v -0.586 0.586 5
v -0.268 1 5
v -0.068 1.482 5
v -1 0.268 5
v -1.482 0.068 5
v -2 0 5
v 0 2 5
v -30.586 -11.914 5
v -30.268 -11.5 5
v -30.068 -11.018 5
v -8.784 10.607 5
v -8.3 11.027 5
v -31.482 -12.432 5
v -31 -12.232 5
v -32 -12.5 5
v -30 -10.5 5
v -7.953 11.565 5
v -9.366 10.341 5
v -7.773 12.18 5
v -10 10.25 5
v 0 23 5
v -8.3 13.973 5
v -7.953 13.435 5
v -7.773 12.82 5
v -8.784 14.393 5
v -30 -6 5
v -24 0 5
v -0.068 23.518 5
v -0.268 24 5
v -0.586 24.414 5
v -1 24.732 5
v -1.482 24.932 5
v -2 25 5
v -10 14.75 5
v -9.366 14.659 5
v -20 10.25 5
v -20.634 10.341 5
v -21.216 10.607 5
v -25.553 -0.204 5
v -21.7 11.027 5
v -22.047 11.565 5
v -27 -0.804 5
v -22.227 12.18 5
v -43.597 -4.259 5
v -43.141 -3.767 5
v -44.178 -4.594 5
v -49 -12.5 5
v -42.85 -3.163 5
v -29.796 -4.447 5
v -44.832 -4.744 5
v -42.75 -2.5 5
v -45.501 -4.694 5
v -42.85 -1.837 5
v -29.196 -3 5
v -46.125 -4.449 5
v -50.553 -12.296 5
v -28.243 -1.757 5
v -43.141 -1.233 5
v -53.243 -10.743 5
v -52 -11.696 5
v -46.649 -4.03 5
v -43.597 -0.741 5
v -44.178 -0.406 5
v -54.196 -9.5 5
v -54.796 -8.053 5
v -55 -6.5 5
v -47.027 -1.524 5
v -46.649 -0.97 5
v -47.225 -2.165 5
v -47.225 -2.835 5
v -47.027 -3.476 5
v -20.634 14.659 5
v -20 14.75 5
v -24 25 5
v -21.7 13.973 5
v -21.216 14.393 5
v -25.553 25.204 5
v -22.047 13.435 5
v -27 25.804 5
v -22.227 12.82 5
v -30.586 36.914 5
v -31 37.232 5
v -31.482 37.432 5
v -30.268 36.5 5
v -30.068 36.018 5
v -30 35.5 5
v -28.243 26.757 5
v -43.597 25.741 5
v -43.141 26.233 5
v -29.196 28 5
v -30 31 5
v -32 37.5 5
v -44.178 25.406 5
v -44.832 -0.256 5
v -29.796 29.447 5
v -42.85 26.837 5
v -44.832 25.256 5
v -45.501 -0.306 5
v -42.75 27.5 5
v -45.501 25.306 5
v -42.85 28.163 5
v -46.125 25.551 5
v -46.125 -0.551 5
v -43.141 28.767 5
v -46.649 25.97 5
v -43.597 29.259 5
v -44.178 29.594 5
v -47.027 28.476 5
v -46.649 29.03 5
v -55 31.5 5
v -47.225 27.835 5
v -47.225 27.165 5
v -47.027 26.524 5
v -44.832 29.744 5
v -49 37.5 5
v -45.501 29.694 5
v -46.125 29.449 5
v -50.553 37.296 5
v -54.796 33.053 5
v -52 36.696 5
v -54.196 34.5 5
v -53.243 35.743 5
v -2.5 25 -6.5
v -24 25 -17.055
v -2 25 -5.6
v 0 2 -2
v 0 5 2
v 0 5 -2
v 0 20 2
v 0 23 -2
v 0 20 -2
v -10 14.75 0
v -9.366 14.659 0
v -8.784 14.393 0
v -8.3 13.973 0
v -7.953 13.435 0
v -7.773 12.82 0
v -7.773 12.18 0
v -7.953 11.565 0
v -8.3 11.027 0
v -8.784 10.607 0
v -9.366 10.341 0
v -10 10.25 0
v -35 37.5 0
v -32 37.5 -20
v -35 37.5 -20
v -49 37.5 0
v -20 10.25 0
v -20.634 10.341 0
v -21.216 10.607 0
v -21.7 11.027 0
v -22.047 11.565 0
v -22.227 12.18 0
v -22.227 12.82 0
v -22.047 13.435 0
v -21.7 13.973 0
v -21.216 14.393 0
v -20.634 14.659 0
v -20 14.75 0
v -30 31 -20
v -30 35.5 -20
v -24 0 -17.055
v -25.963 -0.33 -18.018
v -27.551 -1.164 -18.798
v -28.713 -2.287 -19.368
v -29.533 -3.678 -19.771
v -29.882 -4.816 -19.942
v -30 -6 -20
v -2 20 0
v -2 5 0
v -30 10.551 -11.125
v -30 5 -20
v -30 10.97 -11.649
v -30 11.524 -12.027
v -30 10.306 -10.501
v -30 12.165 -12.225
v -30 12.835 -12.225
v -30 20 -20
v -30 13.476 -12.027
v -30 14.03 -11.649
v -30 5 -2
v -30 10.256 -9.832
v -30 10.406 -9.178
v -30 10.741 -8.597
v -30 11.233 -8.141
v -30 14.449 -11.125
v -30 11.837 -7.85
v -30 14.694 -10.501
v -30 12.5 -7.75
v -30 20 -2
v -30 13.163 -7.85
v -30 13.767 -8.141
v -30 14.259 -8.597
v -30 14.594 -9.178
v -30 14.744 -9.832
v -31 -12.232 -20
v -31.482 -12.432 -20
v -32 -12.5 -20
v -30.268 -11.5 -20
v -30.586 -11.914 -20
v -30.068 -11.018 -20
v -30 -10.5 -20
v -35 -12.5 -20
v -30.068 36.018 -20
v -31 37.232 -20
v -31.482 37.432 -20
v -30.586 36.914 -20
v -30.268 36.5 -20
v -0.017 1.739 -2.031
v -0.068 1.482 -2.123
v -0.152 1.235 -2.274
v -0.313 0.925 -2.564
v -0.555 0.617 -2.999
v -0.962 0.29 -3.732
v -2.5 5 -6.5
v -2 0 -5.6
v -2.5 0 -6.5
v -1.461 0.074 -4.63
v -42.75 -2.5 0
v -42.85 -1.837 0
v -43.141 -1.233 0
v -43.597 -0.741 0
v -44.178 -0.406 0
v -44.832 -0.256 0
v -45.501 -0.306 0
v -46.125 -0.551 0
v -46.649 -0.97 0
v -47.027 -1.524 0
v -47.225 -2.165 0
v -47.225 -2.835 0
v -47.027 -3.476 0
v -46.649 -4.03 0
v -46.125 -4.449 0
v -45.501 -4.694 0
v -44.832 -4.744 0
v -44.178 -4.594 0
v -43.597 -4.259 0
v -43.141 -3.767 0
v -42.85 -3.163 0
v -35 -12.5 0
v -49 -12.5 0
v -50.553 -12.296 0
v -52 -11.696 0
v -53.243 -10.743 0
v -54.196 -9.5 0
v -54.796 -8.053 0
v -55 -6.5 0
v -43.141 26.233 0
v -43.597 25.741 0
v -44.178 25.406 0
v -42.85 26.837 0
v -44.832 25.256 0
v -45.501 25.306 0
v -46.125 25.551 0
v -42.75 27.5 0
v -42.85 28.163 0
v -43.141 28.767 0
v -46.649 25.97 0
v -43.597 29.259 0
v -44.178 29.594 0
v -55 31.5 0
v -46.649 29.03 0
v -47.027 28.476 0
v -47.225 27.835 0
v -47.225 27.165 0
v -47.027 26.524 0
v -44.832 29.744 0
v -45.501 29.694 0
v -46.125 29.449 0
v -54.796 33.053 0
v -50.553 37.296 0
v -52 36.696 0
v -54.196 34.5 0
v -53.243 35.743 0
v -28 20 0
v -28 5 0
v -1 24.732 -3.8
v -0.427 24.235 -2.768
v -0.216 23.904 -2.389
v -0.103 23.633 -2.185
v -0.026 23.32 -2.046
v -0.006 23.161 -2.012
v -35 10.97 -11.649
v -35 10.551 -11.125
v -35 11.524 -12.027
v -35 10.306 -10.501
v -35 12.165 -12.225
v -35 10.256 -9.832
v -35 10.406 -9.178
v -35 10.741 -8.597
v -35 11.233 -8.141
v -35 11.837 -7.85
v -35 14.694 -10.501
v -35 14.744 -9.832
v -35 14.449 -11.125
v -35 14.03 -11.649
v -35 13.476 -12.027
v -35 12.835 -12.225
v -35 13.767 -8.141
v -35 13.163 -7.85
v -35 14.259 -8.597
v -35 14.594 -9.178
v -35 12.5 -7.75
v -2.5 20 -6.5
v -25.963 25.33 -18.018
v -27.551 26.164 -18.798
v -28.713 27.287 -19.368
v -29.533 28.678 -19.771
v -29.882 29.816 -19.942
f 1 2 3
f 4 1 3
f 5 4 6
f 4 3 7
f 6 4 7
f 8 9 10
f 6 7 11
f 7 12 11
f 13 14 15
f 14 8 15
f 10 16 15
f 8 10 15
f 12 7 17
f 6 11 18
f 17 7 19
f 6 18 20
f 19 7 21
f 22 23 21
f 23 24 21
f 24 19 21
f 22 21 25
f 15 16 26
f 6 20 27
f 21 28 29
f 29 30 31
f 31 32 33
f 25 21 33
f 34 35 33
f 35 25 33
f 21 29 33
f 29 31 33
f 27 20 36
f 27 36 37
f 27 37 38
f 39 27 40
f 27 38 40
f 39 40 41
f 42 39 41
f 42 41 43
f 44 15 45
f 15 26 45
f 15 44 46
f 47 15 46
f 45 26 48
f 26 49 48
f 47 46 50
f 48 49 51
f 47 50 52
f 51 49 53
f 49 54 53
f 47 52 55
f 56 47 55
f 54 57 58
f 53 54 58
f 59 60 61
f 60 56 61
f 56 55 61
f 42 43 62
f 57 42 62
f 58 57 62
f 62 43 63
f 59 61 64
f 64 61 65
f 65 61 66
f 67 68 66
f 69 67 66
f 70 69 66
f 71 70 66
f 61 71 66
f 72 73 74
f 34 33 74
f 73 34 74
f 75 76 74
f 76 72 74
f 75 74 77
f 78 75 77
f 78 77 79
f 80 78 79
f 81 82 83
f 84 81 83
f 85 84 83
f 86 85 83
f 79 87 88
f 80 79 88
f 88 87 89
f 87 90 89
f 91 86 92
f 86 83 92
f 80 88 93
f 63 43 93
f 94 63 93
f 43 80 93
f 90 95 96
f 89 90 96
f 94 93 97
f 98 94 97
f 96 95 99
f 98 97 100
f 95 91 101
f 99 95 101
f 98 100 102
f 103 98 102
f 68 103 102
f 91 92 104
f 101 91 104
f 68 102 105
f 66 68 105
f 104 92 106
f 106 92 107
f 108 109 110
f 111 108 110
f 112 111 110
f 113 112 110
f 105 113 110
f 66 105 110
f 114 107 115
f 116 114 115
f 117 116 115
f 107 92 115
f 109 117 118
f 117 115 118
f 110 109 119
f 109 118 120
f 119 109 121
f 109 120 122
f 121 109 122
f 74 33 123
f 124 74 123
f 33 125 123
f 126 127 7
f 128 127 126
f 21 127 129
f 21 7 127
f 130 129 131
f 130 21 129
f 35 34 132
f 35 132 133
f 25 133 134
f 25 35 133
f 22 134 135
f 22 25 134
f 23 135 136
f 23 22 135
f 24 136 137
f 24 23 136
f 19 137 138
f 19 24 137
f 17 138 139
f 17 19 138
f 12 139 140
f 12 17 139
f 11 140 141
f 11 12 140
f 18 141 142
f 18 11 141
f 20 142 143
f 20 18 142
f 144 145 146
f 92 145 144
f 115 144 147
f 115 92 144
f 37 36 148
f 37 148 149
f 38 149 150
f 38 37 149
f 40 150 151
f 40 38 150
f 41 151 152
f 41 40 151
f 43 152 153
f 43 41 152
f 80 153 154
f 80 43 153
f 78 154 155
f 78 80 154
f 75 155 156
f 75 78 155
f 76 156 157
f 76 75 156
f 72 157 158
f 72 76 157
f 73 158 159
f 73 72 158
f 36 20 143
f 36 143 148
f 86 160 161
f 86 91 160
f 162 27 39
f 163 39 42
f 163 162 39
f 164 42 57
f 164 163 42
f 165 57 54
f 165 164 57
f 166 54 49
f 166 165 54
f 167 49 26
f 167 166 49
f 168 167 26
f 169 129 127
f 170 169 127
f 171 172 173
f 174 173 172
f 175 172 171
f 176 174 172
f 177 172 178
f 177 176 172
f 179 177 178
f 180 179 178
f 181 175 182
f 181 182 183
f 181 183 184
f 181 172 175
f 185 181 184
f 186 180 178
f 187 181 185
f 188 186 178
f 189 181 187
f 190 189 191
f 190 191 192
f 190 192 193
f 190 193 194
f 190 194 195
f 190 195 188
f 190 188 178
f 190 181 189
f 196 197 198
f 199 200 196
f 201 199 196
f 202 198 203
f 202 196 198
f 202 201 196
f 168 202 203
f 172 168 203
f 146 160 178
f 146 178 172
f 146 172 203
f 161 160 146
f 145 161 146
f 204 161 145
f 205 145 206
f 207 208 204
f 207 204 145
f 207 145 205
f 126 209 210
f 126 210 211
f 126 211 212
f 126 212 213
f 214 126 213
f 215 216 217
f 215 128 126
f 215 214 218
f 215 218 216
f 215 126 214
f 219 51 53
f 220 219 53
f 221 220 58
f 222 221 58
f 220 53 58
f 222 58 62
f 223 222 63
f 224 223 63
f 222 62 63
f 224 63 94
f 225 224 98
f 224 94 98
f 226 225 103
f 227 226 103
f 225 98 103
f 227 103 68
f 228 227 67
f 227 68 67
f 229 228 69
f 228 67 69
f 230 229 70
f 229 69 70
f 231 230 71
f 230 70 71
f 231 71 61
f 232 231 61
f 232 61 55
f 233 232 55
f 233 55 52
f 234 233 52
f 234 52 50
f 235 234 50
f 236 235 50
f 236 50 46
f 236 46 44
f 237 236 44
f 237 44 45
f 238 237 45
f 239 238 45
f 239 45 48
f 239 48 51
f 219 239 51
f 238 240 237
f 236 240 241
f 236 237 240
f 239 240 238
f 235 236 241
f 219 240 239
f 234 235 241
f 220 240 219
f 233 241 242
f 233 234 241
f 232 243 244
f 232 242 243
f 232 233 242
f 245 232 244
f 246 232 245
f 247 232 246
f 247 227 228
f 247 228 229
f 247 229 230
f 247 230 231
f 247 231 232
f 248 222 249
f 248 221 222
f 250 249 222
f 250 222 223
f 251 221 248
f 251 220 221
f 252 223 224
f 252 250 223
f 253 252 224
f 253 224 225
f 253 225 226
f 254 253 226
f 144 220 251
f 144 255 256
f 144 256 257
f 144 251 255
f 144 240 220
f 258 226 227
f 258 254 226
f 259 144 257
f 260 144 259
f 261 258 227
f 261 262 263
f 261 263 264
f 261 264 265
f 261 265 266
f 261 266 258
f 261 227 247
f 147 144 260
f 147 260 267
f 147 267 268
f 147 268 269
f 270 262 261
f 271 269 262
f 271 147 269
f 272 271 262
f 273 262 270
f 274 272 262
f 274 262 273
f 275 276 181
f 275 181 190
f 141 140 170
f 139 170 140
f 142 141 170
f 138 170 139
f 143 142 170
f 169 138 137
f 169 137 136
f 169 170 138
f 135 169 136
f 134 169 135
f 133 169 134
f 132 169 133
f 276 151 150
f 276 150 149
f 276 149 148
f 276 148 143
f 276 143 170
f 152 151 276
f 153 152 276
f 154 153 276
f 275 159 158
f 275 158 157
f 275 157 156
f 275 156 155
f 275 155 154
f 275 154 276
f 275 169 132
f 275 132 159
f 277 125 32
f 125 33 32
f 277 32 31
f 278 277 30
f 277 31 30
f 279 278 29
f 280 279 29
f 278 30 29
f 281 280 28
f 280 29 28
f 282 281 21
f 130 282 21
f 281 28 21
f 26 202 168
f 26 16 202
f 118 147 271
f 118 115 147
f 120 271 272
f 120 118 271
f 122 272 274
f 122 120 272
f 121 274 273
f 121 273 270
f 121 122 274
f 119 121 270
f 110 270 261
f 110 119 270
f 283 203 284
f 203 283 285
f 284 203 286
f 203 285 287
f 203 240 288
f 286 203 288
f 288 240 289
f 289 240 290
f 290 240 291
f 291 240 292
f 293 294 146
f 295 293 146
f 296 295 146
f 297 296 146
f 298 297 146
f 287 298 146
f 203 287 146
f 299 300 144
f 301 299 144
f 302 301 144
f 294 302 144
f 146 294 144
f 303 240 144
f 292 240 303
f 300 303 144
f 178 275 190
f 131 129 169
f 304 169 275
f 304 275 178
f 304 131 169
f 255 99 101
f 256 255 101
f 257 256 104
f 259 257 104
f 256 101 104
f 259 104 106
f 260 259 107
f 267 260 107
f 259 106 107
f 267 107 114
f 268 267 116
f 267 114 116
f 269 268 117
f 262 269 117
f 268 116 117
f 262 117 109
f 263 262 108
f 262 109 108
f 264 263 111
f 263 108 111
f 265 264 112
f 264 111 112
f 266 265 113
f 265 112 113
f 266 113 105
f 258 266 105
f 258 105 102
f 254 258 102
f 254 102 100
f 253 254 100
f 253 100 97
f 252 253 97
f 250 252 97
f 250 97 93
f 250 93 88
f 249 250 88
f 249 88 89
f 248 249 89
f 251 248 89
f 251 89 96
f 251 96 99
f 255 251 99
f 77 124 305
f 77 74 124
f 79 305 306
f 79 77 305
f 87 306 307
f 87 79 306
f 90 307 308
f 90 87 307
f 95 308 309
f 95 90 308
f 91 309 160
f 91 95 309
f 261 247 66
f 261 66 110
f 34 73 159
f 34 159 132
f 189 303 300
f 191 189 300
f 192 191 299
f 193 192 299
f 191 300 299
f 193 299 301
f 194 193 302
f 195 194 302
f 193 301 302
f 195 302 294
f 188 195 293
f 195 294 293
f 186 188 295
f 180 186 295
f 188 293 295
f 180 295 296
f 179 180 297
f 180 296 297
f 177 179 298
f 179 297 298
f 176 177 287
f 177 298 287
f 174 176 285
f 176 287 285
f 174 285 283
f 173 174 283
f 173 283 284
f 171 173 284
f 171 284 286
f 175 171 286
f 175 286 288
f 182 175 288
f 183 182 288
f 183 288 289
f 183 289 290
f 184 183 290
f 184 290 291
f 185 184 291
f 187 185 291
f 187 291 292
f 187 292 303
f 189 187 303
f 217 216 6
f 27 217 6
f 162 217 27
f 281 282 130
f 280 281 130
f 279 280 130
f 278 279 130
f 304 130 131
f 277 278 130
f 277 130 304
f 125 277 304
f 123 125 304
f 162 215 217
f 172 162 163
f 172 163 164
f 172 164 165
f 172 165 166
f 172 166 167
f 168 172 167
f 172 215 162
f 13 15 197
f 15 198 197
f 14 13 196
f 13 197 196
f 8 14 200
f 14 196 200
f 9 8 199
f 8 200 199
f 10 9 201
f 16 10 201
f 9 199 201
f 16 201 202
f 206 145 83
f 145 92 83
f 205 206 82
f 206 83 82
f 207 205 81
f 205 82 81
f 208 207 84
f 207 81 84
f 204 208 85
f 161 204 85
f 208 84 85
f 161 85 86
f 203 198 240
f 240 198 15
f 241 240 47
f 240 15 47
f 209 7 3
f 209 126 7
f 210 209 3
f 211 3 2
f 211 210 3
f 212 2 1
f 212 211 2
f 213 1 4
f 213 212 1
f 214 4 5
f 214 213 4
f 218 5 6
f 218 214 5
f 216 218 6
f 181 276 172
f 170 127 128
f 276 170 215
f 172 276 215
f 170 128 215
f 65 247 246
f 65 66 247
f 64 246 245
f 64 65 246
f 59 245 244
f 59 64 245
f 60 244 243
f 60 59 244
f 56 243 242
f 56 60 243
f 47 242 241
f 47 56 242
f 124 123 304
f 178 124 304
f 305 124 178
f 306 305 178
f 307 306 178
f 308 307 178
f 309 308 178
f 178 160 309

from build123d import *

# Parameters (mm, degrees)
BOSS_EXTRUDE1_DEPTH = 5
SKETCH2_R           = 2.25
CUT_EXTRUDE1_DEPTH  = 6
SKETCH3_W           = 5
SKETCH3_H           = 50
BOSS_EXTRUDE2_DEPTH = 20
SKETCH4_R           = 2.25
CUT_EXTRUDE2_DEPTH  = 36
SKETCH5_W           = 20
SKETCH5_H           = 5
BOSS_EXTRUDE3_DEPTH = 30
CUT_EXTRUDE3_DEPTH  = 38.5
FILLET1_R           = 6
CHAMFER1_SIZE       = 2
FILLET2_R           = 6
FILLET3_R           = 2


with BuildPart() as part:
    # Sketch1 → Boss-Extrude1 (new body)
    with BuildSketch(Plane.XY):
        Polygon((0, 25), (0, 0), (-30, 0), (-30, -12.5), (-55, -12.5), (-55, 37.5), (-30, 37.5), (-30, 25), align=None)
    extrude(amount=BOSS_EXTRUDE1_DEPTH)

    # Sketch2 → Cut-Extrude1 (cut, through all)
    with BuildSketch(Plane.XY.offset(5)):
        with Locations((-45, -2.5)):
            Circle(SKETCH2_R)
        with Locations((-45, 27.5)):
            Circle(SKETCH2_R)
        with BuildLine():
            Line((-10, 10.25), (-20, 10.25))
            ThreePointArc((-20, 10.25), (-22.25, 12.5), (-20, 14.75))
            Line((-20, 14.75), (-10, 14.75))
            ThreePointArc((-10, 14.75), (-7.75, 12.5), (-10, 10.25))
        make_face()
    extrude(amount=-CUT_EXTRUDE1_DEPTH, mode=Mode.SUBTRACT)

    # Sketch3 → Boss-Extrude2 (add)
    with BuildSketch(Plane(origin=(0, 0, 0), x_dir=(-1, 0, 0), z_dir=(0, 0, -1))):
        with Locations((32.5, 12.5)):
            Rectangle(SKETCH3_W, SKETCH3_H)
    extrude(amount=BOSS_EXTRUDE2_DEPTH)

    # Sketch4 → Cut-Extrude2 (cut, through all)
    with BuildSketch(Plane.ZY.offset(35)):
        with Locations((-10, 12.5)):
            Circle(SKETCH4_R)
    extrude(amount=-CUT_EXTRUDE2_DEPTH, mode=Mode.SUBTRACT)

    # Sketch5 → Boss-Extrude3 (add)
    with BuildSketch(Plane(origin=(0, 0, 0), x_dir=(0, 0, -1), z_dir=(1, 0, 0))):
        with Locations((10, 22.5)):
            Rectangle(SKETCH5_W, SKETCH5_H)
        with Locations((10, 2.5)):
            Rectangle(SKETCH5_W, SKETCH5_H)
    extrude(amount=-BOSS_EXTRUDE3_DEPTH)

    # Sketch6 → Cut-Extrude3 (cut, through all)
    with BuildSketch(Plane(origin=(0, 25, 0), x_dir=(1, 0, 0), z_dir=(0, 1, 0))):
        Polygon((-30, 20), (0, 20), (0, 2), (-2.5, 6.5), align=None)
    extrude(amount=-CUT_EXTRUDE3_DEPTH, mode=Mode.SUBTRACT)

    # Fillet1
    fillet1_edges = [part.edges().sort_by_distance(p)[0] for p in [
        (-30, 0, -7.5),
        (-30, 25, -7.5),
    ]]
    fillet(fillet1_edges, radius=FILLET1_R)

    # Chamfer1
    chamfer1_edges = [part.edges().sort_by_distance(p)[0] for p in [
        (-30, 12.5, 0),
        (0, 12.5, 0),
    ]]
    chamfer(chamfer1_edges, length=CHAMFER1_SIZE)

    # Fillet2
    fillet2_edges = [part.edges().sort_by_distance(p)[0] for p in [
        (-55, -12.5, 2.5),
        (-55, 37.5, 2.5),
    ]]
    fillet(fillet2_edges, radius=FILLET2_R)

    # Fillet3
    fillet3_edges = [part.edges().sort_by_distance(p)[0] for p in [
        (0, 25, 1.5),
        (0, 0, 1.5),
        (-30, -12.5, -7.5),
        (-30, 37.5, -7.5),
    ]]
    fillet(fillet3_edges, radius=FILLET3_R)


solid = part.part
